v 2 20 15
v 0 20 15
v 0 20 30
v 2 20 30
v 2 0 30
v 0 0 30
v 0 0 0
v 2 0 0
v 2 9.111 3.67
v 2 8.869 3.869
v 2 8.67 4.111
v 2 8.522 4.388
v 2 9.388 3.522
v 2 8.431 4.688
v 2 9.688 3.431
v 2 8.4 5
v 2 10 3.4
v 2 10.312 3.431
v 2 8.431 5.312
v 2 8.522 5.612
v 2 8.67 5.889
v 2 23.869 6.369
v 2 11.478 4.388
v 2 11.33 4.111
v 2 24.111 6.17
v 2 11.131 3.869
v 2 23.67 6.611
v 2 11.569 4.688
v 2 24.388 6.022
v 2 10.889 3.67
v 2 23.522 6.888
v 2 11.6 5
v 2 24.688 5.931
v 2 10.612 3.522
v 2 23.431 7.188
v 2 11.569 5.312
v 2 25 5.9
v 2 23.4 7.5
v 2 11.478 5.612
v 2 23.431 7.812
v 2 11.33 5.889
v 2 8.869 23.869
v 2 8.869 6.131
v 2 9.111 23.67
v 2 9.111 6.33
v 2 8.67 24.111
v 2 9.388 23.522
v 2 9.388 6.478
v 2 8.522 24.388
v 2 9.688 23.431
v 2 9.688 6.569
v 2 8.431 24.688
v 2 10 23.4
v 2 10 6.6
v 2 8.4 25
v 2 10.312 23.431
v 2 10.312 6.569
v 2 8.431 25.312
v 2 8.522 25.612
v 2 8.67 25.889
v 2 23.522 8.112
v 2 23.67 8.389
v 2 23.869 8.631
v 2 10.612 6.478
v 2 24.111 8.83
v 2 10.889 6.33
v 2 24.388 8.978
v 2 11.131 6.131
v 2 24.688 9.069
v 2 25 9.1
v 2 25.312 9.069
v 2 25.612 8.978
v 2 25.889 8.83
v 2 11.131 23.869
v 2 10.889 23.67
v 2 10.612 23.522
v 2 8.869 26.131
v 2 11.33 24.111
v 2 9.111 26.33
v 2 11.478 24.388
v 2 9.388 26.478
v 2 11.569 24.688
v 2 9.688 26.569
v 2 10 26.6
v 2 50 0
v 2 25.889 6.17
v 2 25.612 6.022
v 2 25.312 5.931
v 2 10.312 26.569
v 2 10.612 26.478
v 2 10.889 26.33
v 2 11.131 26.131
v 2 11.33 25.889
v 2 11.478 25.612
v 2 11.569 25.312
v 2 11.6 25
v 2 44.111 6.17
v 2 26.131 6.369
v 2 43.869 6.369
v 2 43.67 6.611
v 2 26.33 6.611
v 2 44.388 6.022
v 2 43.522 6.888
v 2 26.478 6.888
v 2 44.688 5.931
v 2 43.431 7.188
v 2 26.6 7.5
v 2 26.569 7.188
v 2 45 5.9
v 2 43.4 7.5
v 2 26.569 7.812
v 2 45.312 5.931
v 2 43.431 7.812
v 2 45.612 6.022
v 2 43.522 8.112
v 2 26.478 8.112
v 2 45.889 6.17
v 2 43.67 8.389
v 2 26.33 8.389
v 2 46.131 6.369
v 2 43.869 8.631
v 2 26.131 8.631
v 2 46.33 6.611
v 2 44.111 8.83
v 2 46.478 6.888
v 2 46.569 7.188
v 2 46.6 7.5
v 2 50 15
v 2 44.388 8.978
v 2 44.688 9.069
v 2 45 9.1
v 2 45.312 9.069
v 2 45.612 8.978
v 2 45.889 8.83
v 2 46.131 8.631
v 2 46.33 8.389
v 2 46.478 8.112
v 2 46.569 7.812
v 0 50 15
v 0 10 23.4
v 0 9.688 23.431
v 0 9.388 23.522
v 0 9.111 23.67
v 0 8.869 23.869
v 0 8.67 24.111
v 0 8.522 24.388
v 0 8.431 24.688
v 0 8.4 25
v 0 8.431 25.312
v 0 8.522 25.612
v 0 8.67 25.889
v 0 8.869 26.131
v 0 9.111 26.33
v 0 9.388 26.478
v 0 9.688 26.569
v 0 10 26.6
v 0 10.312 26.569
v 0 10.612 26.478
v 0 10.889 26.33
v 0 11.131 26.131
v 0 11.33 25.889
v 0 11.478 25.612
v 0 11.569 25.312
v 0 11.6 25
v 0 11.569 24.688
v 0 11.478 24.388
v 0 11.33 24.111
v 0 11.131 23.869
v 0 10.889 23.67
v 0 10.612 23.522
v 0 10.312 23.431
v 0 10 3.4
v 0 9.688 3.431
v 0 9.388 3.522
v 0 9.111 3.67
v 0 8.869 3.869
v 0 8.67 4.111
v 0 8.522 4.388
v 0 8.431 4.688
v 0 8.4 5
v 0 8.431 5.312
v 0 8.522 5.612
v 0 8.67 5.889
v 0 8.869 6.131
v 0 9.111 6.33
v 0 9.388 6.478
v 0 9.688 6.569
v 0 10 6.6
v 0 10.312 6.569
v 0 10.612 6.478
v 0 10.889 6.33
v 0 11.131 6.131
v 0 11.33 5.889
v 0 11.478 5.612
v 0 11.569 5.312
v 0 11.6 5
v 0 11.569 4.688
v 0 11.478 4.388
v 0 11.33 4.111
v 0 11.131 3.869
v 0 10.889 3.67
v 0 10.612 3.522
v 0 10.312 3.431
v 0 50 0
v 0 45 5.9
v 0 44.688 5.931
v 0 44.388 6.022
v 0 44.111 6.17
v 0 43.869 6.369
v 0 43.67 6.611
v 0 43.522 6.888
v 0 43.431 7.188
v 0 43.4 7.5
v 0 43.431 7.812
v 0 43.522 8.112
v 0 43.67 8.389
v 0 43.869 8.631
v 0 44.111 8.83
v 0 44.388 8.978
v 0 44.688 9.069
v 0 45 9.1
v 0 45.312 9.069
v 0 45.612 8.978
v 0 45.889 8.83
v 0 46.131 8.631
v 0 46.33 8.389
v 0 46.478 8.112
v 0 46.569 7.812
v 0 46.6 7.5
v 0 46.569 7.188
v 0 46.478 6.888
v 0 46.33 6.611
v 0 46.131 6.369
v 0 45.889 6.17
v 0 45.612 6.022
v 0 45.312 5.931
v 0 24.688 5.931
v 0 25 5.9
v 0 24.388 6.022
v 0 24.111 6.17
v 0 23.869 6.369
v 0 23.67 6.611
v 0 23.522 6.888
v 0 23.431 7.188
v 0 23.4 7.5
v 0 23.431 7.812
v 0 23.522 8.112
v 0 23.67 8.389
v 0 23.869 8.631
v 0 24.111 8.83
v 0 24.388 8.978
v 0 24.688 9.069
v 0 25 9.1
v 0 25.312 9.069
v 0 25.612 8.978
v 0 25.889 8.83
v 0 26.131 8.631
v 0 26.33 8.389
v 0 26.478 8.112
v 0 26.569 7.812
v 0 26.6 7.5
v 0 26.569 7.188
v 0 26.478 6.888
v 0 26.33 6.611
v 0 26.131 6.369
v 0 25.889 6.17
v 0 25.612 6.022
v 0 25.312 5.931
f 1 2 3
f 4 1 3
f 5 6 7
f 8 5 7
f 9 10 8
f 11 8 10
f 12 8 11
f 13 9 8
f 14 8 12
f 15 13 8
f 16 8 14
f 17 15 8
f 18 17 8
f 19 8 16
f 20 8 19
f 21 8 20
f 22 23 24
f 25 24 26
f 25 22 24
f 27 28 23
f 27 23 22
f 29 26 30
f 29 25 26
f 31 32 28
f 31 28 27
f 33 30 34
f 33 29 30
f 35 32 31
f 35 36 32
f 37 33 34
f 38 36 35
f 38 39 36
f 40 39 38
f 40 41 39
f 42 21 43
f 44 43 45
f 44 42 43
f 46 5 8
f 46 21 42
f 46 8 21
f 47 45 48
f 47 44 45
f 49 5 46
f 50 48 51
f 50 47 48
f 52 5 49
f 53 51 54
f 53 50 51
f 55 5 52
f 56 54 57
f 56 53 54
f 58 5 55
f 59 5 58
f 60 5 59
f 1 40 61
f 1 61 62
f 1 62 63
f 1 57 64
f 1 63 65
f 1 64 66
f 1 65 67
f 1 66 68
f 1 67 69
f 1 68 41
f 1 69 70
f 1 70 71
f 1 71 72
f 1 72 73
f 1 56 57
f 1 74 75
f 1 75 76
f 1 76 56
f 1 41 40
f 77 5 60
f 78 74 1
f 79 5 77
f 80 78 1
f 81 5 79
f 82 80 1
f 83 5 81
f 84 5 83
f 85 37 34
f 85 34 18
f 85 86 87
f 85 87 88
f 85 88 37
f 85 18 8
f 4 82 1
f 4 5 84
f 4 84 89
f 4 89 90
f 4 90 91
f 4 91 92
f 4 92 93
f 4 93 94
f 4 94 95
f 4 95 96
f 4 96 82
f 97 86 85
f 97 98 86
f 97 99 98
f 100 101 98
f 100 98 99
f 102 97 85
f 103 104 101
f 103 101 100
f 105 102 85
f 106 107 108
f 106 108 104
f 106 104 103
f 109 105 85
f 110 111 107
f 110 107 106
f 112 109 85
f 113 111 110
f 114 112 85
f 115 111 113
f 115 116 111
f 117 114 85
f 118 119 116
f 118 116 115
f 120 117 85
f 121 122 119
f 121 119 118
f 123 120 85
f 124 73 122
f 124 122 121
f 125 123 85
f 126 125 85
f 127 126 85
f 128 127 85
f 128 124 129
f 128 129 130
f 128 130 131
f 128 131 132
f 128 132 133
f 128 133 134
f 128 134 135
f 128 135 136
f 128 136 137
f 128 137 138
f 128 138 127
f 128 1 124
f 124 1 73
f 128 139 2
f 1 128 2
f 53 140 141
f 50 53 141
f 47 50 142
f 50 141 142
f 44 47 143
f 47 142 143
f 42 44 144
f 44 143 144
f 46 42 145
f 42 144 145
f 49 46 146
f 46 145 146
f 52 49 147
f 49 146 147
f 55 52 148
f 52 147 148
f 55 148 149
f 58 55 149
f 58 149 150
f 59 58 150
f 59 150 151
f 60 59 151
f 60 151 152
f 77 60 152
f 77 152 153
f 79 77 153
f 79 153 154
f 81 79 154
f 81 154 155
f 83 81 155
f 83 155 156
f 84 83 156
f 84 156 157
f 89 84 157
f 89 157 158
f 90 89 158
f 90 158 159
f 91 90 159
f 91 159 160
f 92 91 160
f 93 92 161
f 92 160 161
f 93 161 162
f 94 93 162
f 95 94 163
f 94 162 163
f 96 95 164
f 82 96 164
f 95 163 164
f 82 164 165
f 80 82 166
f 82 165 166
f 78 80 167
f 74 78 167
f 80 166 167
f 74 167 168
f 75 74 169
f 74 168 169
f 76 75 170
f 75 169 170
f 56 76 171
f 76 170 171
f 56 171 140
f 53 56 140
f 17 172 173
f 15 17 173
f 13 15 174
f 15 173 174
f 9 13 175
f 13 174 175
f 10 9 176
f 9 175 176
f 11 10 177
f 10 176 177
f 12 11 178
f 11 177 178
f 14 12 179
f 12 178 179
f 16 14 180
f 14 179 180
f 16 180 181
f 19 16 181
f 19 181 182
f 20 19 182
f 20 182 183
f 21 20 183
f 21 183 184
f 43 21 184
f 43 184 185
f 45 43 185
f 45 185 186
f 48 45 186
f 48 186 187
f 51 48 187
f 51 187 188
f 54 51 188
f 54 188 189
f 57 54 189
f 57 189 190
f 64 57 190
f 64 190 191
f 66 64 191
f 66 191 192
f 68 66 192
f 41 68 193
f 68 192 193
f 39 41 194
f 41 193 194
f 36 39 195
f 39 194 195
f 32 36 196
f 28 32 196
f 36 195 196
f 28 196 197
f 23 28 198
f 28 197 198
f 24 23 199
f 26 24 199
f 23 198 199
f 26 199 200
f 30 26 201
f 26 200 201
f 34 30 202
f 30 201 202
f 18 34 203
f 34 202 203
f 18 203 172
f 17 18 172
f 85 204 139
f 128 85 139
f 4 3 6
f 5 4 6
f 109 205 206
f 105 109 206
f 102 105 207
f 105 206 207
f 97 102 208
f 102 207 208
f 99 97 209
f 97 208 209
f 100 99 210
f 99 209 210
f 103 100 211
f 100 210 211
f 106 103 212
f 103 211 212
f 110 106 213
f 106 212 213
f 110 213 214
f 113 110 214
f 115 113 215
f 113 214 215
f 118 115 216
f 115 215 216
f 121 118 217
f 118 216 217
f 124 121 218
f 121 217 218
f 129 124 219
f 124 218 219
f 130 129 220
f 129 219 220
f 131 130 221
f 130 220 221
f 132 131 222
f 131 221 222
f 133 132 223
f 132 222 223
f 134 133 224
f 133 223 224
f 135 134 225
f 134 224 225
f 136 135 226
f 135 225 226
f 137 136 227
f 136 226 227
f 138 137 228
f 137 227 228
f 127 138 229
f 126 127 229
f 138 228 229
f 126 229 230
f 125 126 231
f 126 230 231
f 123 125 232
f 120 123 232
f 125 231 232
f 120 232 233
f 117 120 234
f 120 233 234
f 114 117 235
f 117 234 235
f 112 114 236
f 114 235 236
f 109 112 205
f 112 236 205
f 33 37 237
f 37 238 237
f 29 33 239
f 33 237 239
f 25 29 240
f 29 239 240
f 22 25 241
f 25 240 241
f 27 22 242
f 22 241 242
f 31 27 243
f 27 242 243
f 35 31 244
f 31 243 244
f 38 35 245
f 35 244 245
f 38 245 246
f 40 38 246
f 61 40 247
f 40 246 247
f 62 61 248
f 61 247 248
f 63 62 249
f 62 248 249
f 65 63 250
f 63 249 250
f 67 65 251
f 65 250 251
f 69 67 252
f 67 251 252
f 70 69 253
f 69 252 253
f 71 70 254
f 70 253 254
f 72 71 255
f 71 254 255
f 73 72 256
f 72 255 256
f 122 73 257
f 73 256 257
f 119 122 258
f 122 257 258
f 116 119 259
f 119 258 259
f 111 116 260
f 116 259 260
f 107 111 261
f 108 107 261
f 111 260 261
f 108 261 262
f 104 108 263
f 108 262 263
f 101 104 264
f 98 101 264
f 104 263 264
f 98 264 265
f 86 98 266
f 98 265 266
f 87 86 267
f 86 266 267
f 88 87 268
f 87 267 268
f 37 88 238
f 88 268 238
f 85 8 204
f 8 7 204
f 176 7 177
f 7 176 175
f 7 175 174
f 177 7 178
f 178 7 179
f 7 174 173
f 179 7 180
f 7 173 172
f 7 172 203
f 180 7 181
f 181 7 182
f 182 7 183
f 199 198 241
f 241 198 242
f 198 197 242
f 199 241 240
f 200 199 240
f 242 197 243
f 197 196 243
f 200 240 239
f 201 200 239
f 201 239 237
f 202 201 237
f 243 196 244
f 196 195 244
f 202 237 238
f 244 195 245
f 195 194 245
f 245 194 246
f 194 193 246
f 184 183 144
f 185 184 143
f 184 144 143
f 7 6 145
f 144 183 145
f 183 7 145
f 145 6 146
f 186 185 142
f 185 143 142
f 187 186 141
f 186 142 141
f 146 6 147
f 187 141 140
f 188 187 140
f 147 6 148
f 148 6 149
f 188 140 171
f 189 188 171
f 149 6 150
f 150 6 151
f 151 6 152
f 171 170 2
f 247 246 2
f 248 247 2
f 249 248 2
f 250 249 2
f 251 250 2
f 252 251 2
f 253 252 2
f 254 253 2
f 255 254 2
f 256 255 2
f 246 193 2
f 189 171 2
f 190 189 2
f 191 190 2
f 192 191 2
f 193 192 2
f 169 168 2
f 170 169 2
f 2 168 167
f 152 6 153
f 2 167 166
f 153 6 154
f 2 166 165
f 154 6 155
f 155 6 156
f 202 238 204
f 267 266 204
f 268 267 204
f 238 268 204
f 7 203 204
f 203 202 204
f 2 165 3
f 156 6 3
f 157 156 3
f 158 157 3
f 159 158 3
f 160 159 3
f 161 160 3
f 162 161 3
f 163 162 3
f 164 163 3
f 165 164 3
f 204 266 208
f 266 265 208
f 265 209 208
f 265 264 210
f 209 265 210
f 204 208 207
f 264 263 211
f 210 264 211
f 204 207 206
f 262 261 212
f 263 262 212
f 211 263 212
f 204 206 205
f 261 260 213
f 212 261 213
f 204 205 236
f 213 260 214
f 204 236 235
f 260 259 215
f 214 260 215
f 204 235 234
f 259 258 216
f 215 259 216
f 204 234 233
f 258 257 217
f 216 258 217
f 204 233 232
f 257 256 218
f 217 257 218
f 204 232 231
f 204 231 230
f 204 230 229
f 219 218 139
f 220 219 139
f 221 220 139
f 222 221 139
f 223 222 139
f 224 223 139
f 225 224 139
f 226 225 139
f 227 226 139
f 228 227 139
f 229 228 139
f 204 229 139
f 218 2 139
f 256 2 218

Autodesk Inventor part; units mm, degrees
ref_plane "YZ Plane" through (0, 0, 0) normal (1, 0, 0) x (0, 1, 0)
ref_plane "XZ Plane" through (0, 0, 0) normal (0, 1, 0) x (-1, 0, 0)
ref_plane "XY Plane" through (0, 0, 0) normal (0, 0, 1) x (1, 0, 0)
sketch "スケッチ1" plane through (0, 0, 0) normal (1, 0, 0) x (0, 1, 0)
  line L0 (0, 0) -> (50, 0)
  line L1 (50, 0) -> (50, 15)
  line L2 (50, 15) -> (0, 15)
  line L3 (0, 15) -> (0, 0)
  line L4 (0, 0) -> (20, 0)
  line L5 (20, 0) -> (20, 30)
  line L6 (20, 30) -> (0, 30)
  line L7 (0, 30) -> (0, 0)
  point P0 (0, 15)
  point P1 (20, 15)
  point P2 (20, 0)
  point P3 (20, 0)
  dimension "d0" = 15
  dimension "d1" = 20
  dimension "d2" = 30
  dimension "d3" = 30
extrude "押し出し1" add sketch "スケッチ1" along normal blind 2
sketch "スケッチ2" plane through (2, 0, 0) normal (1, 0, 0) x (0, 0, -1)
  line L0 (-30, 20) -> (-30, 0) projected
  line L1 (-30, 10) -> (0, 10) construction
  line L2 (0, 0) -> (0, 50) projected
  line L3 (0, 50) -> (-15, 50) projected
  line L4 (-7.5, 50) -> (-7.5, 0) construction
  line L5 (-30, 0) -> (0, 0) projected
  point P0 (-25, 10)
  point P1 (-5, 10)
  point P2 (-7.5, 25)
  point P3 (-7.5, 45)
  dimension "d6" = 20
  dimension "d7" = 5
  dimension "d8" = 20
  dimension "d9" = 5
hole "穴1" at (2, 10, 25) at (2, 10, 5) at (2, 25, 7.5) at (2, 45, 7.5) direction (-1, 0, 0) diameter 3.2 end through all
properties part number "FrameJointL2015" material "アルミニウム 6061"
